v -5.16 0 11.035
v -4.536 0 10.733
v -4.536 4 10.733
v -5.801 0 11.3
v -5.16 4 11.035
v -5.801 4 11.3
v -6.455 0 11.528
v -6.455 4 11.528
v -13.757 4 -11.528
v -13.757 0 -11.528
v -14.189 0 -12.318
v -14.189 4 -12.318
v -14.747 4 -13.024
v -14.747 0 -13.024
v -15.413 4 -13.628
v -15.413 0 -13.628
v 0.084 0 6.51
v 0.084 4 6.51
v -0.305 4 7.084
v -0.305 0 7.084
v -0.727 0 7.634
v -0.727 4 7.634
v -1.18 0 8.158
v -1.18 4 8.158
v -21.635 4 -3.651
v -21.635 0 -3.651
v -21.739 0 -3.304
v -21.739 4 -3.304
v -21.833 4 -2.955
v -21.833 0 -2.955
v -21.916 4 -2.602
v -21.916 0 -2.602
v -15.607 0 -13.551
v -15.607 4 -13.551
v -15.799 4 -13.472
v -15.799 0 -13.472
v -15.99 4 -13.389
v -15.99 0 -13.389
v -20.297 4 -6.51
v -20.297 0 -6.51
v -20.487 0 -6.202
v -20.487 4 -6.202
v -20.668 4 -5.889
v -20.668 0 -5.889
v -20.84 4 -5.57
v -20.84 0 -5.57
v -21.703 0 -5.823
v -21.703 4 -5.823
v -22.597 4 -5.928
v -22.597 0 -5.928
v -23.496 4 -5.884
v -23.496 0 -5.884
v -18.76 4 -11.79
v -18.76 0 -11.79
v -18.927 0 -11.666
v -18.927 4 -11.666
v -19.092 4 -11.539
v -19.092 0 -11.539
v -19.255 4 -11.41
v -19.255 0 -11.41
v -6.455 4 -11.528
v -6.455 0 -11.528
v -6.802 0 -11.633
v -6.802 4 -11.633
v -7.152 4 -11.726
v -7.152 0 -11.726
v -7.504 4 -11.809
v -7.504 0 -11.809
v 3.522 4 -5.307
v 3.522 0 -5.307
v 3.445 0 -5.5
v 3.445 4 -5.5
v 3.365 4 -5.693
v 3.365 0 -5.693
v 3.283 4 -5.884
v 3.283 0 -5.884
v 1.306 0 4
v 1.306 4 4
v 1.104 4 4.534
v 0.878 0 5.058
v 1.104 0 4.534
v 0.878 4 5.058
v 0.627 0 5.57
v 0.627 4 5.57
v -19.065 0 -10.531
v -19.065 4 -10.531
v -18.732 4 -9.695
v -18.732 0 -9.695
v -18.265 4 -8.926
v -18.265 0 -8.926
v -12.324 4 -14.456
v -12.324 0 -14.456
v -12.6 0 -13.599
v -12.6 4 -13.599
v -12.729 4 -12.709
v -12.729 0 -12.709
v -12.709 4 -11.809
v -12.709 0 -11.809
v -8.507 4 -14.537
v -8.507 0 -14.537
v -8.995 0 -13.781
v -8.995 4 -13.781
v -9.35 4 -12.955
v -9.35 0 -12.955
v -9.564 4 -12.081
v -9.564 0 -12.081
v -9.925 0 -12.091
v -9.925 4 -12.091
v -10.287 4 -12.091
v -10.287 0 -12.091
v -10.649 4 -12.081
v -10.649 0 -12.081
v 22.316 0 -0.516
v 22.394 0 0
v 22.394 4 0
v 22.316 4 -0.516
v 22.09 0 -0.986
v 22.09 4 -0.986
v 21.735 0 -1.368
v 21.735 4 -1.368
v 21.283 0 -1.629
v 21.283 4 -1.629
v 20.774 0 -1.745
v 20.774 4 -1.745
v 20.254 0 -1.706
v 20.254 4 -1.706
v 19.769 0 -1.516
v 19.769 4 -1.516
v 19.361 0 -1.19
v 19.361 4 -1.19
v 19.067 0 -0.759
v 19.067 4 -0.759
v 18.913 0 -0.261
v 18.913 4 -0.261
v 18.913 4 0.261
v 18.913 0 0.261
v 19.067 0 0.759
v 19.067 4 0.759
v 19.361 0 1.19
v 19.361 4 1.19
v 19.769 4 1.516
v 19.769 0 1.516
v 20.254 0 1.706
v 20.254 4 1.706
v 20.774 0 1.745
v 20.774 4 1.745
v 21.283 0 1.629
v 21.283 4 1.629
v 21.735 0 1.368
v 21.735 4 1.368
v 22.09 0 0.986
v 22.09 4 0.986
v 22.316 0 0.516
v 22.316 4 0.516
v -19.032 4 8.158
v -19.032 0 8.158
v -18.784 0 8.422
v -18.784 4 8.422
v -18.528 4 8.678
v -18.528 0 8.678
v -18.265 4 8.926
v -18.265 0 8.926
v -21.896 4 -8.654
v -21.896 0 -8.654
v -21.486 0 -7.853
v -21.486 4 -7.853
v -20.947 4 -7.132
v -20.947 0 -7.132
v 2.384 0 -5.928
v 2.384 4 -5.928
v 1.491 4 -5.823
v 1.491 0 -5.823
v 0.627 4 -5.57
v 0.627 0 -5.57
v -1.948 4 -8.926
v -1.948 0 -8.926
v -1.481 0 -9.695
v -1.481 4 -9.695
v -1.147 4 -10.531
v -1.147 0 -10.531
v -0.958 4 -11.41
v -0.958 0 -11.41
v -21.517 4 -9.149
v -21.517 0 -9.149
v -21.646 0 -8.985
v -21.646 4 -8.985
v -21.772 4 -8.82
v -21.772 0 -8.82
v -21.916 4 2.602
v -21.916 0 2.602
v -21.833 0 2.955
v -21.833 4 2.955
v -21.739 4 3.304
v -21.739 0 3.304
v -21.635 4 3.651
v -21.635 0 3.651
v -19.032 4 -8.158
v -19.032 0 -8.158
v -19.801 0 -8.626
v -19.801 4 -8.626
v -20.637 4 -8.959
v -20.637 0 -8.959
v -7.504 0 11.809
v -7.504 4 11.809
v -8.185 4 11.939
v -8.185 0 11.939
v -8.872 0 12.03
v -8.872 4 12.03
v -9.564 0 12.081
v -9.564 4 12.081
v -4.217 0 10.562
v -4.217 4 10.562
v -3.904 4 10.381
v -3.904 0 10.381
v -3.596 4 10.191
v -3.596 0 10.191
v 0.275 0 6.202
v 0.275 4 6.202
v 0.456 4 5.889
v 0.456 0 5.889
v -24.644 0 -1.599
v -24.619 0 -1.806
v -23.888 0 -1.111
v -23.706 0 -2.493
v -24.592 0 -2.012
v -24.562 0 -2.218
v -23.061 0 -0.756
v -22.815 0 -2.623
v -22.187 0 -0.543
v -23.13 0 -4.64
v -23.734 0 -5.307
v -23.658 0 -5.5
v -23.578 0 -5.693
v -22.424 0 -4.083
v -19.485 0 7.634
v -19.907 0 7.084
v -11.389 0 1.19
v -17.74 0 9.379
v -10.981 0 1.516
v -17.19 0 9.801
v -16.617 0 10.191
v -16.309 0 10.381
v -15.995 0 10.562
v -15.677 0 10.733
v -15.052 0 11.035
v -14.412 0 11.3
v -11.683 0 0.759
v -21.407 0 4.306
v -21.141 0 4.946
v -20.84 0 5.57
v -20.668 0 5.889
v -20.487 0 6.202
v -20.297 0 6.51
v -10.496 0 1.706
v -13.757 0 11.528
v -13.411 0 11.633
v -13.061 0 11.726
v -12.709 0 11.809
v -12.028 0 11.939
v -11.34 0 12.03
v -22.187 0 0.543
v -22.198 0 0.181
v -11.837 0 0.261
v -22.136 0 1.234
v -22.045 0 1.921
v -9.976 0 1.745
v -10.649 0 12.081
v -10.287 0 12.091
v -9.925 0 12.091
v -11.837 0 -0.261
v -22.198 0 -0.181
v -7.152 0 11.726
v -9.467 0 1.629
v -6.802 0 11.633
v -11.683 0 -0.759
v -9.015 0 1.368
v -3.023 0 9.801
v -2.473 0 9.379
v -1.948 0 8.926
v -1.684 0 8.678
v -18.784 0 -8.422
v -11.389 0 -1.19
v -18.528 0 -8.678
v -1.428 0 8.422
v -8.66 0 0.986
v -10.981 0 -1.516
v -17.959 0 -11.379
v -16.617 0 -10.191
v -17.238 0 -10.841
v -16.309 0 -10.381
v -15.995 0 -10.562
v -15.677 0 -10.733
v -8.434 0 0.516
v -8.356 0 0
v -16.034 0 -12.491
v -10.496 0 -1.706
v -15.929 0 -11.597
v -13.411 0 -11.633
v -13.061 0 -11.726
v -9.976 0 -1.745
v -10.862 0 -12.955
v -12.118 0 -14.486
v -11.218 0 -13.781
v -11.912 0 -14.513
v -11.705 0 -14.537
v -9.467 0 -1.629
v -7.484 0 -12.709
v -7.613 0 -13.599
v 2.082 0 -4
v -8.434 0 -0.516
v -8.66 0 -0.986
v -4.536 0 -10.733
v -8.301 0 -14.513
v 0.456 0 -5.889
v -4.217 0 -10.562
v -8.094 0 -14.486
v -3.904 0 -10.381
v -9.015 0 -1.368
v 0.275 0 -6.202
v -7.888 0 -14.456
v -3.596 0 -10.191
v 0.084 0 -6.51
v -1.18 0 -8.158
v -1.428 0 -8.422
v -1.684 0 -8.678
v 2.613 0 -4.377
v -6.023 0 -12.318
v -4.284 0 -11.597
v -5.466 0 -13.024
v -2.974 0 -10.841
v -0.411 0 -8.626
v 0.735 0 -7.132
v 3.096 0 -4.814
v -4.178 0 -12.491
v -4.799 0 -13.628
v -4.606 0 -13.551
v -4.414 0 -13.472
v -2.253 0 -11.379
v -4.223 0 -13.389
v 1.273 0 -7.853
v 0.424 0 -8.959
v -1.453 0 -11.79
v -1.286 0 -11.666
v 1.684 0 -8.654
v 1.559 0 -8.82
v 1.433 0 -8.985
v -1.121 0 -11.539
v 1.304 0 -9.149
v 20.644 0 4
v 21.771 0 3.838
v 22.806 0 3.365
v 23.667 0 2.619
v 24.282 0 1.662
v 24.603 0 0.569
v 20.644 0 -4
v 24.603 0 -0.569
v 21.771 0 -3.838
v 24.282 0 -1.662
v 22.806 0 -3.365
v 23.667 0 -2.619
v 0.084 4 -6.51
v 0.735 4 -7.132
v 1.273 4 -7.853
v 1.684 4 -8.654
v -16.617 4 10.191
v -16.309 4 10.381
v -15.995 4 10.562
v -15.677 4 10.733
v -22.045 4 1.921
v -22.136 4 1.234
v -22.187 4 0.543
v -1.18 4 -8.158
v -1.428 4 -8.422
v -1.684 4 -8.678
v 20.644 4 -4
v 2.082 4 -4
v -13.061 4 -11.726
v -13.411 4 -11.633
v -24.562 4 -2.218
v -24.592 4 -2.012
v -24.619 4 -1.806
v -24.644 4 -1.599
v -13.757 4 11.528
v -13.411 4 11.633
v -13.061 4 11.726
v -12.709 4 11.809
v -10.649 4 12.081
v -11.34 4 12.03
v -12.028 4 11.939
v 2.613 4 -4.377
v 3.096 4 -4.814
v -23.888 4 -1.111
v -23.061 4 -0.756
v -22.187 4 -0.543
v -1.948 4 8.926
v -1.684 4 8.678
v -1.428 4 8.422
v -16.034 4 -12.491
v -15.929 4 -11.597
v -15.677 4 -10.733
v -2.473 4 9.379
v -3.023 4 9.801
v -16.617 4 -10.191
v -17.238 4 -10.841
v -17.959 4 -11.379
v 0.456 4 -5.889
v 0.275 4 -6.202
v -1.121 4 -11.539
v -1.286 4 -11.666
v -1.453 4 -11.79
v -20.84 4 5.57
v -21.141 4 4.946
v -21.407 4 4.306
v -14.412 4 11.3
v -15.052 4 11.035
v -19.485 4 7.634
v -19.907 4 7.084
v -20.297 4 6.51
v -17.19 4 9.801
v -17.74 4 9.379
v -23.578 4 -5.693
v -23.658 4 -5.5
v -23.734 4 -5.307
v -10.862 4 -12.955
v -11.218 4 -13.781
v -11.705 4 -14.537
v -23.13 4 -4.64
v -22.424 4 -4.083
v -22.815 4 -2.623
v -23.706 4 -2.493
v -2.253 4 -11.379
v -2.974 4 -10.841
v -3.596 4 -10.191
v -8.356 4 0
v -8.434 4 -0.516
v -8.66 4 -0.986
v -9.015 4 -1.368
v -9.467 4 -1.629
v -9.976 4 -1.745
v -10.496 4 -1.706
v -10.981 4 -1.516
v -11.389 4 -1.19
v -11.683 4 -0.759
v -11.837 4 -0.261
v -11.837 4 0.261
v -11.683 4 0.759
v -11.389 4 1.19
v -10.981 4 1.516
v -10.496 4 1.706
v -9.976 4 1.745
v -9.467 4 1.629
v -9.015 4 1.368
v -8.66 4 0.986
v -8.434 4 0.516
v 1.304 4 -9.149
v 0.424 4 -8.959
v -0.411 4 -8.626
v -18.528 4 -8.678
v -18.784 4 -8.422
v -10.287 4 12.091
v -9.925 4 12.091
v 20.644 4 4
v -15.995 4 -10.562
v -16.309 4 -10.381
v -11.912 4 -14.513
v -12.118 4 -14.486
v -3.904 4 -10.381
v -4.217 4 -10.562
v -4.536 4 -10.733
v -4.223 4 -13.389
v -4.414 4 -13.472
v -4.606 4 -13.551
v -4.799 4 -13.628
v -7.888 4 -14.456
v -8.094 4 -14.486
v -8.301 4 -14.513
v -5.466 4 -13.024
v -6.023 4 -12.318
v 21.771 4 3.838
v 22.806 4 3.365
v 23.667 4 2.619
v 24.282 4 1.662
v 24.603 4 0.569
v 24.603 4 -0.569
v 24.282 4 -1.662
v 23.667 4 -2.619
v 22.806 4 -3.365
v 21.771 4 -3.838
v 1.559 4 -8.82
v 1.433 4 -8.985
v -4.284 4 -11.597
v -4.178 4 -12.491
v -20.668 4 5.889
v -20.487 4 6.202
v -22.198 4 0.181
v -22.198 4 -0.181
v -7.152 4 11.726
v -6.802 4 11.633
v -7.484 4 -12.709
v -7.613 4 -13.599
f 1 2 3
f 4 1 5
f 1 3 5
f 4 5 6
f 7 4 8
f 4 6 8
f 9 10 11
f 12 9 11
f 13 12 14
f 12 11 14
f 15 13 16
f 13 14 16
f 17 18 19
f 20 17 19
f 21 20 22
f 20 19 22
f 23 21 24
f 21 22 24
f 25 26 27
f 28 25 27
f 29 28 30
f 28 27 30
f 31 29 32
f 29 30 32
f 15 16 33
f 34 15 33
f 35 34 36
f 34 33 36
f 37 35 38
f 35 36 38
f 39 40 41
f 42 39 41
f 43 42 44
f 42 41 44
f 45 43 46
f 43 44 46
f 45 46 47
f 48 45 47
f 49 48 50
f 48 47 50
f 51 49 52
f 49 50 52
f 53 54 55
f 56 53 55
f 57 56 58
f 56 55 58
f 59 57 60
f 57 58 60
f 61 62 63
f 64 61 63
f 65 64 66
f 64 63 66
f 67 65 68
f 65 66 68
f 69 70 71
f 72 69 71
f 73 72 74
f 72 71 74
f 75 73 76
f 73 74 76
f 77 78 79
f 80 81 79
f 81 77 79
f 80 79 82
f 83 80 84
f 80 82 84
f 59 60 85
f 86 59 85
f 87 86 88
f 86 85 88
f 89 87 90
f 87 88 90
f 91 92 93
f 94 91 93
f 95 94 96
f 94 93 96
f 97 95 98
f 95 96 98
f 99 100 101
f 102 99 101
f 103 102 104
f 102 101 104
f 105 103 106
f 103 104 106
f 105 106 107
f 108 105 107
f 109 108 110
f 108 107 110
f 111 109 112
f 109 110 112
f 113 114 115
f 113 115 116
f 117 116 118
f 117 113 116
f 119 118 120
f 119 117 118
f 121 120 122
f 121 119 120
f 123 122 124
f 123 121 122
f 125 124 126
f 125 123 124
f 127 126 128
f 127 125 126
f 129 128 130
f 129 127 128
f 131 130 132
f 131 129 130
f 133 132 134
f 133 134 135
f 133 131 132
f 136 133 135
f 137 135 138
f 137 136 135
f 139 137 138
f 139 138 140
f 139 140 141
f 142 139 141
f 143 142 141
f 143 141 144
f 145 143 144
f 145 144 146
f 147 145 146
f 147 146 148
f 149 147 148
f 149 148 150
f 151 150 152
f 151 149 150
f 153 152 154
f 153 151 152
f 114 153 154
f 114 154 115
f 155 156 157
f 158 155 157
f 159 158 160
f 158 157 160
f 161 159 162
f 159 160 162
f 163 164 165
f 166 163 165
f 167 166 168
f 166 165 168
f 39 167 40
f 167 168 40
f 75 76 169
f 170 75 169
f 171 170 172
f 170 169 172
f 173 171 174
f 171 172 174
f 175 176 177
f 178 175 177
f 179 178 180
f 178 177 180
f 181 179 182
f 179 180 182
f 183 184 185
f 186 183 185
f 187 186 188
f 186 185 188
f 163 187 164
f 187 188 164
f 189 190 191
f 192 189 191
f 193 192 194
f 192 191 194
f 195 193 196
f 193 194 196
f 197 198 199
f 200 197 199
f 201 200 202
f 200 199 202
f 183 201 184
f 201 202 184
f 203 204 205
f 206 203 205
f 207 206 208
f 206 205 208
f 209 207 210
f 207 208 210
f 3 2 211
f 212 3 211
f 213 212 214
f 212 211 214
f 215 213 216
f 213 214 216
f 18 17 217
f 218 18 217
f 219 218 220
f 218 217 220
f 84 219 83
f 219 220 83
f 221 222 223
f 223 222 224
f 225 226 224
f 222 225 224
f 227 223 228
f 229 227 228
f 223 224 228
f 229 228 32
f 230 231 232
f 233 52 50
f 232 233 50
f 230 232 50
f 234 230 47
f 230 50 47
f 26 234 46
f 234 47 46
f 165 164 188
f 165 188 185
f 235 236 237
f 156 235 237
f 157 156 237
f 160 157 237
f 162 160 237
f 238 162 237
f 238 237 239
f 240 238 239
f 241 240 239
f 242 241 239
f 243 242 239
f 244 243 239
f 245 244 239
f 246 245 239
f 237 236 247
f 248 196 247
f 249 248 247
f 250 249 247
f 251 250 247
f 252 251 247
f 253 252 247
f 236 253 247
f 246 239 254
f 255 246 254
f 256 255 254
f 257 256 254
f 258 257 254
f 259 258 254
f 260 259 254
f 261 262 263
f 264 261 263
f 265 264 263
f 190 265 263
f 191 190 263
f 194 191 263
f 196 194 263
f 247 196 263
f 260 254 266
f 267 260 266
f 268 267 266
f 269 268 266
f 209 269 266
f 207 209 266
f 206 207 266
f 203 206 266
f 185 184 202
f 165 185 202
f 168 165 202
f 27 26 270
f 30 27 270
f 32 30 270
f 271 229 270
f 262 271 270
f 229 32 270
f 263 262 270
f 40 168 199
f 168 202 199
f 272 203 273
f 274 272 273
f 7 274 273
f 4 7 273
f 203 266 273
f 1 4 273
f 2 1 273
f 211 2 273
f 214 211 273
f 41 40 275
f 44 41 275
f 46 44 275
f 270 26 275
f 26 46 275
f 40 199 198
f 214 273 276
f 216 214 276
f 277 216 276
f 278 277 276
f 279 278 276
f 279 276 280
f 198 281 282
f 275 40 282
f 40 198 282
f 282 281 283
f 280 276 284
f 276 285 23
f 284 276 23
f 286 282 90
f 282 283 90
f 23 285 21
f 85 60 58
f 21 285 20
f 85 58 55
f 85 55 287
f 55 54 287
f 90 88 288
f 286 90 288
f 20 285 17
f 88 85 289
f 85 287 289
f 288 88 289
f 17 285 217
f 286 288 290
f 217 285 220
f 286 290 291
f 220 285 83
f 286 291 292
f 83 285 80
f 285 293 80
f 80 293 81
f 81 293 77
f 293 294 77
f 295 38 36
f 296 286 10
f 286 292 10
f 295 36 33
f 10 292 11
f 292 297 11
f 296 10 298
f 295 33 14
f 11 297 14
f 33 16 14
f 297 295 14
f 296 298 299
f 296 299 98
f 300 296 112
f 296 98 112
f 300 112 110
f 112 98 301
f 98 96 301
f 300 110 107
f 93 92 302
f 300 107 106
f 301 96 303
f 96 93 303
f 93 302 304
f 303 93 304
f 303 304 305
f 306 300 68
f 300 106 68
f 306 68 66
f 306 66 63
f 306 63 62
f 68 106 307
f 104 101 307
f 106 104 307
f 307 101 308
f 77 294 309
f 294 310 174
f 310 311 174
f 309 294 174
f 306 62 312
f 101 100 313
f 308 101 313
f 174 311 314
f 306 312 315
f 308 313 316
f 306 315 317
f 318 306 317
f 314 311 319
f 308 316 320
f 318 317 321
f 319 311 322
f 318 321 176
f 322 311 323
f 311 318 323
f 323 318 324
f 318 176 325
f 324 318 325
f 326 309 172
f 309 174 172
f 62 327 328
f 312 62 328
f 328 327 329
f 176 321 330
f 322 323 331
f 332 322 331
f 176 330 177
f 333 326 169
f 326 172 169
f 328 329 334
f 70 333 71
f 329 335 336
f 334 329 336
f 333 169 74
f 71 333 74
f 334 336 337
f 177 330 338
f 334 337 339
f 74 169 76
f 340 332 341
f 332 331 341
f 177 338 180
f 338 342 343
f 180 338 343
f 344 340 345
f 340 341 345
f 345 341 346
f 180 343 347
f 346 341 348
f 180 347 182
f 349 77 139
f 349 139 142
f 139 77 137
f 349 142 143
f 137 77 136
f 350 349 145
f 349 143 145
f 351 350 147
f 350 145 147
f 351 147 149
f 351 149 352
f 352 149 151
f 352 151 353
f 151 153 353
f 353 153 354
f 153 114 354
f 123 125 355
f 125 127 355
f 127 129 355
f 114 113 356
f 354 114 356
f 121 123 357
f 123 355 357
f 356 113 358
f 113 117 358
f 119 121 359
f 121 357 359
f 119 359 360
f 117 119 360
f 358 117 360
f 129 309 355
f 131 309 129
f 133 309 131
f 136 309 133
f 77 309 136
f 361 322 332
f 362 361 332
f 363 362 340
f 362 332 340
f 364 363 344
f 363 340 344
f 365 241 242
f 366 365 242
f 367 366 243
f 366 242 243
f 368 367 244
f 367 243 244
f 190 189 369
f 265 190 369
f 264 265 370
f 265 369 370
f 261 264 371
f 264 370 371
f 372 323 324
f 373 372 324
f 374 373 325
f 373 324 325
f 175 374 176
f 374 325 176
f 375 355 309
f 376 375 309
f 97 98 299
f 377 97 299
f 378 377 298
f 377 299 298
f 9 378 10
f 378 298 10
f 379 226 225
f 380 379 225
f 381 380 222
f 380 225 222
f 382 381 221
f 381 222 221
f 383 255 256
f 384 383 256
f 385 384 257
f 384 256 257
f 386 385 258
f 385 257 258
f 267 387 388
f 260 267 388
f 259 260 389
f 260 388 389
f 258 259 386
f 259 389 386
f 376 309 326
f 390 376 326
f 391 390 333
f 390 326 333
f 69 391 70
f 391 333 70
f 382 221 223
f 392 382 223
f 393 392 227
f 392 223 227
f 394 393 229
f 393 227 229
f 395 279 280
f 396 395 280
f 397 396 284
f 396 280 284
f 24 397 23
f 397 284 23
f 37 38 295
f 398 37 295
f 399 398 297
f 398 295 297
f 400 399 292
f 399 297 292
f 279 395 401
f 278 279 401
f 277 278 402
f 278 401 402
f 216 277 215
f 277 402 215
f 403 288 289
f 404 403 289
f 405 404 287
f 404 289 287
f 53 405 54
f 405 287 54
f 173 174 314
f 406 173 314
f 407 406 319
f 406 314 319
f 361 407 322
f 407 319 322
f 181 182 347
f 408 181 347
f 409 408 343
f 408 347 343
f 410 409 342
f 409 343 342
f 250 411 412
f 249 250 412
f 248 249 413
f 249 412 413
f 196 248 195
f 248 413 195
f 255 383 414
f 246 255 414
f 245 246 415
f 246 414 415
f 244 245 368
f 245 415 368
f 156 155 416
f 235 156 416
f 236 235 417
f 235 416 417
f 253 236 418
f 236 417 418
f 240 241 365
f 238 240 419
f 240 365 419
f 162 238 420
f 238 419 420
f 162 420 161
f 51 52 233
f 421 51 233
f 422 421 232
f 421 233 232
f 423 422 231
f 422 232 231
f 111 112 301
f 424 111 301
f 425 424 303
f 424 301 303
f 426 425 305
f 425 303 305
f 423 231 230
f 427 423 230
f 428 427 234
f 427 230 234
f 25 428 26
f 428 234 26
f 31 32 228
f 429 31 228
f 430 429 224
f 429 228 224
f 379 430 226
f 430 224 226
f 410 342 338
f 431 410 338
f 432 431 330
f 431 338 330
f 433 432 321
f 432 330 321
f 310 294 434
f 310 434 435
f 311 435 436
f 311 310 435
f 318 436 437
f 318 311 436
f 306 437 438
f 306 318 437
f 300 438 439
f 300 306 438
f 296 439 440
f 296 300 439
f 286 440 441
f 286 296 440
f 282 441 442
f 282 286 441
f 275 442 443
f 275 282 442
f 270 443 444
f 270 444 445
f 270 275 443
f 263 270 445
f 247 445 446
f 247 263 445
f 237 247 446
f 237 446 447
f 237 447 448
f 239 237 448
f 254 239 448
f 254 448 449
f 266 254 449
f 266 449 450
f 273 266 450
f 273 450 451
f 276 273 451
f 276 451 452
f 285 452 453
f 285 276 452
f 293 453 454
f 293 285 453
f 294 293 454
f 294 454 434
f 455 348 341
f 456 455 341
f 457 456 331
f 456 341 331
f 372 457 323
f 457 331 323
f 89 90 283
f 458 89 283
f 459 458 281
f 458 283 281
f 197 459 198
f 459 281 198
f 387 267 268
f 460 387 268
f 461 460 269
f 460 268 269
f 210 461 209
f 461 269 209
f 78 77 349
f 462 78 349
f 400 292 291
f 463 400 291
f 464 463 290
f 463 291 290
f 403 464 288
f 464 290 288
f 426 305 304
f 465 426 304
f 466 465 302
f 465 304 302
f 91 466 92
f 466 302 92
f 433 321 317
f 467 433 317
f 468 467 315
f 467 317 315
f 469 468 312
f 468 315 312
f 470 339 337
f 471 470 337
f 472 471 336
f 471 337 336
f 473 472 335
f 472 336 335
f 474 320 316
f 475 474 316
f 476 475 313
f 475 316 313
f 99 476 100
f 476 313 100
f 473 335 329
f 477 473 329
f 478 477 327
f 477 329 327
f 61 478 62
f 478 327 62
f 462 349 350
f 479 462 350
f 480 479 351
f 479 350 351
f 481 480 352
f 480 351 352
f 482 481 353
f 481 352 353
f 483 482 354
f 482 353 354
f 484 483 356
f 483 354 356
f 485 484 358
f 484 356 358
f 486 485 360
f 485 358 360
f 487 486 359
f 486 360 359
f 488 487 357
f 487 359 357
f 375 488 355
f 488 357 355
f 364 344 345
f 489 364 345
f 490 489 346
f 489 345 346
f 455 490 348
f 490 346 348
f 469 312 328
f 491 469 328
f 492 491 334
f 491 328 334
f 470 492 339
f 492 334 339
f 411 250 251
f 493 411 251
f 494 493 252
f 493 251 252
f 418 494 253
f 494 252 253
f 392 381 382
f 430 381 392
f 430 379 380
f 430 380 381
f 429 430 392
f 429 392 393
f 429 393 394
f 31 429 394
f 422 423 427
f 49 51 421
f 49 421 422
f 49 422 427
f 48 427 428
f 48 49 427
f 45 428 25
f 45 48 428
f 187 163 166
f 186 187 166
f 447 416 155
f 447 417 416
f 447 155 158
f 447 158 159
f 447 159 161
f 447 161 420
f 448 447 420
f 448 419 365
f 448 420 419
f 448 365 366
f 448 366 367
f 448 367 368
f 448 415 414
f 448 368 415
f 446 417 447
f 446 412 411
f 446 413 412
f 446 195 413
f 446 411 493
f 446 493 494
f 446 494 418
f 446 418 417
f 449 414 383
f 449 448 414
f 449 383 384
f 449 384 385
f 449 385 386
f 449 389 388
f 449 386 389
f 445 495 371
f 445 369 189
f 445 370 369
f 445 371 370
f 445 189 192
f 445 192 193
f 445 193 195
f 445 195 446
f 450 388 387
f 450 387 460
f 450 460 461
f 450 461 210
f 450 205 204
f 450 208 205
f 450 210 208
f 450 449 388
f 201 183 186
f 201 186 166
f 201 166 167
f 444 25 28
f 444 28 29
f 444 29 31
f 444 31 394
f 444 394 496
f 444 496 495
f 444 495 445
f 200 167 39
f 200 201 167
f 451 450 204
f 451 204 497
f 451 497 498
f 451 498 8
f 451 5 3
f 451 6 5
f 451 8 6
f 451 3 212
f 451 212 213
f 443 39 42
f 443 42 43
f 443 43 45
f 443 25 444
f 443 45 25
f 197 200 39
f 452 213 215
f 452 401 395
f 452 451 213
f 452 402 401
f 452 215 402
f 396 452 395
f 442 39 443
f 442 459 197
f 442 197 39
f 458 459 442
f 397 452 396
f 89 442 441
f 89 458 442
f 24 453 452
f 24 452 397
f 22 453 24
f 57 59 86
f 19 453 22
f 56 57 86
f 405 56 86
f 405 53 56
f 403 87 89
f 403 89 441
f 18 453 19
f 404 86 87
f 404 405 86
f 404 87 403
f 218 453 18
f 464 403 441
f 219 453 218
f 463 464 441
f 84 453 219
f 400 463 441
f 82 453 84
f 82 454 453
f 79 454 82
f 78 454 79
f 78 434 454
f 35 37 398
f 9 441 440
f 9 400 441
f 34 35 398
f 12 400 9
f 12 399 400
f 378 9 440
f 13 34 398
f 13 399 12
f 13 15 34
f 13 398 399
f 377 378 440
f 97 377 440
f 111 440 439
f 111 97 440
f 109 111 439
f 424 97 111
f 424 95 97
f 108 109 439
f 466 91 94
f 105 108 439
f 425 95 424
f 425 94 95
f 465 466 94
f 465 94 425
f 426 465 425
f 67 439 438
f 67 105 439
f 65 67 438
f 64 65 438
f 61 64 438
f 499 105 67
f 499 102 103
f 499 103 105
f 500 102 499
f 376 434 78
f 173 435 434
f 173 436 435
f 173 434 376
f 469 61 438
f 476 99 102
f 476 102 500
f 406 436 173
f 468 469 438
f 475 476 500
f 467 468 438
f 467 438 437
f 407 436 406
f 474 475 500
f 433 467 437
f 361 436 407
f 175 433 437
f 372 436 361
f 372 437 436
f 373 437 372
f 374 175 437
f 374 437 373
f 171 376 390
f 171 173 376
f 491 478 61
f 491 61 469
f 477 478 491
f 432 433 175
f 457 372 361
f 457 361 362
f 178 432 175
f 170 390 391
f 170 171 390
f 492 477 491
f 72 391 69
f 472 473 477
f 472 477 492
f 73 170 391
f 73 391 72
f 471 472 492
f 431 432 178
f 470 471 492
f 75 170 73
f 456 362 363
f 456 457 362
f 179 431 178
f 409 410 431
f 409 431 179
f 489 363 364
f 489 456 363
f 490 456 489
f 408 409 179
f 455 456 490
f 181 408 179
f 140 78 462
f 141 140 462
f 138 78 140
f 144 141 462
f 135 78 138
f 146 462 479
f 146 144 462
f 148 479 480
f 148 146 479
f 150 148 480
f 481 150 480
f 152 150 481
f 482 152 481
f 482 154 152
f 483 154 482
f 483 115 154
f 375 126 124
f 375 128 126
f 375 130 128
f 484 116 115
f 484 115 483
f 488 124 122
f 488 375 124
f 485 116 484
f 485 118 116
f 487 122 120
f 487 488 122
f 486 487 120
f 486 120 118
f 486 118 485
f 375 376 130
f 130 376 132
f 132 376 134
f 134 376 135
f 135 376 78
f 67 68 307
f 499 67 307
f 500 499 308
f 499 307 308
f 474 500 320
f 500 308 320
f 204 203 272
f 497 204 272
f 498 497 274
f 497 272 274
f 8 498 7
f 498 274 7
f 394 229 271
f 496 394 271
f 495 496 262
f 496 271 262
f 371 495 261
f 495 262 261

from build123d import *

# Parameters (mm, degrees)
SKETCH1_R           = 1.75
BOSS_EXTRUDE1_DEPTH = 4
CUT_EXTRUDE1_DEPTH  = 10


with BuildPart() as part:
    # Sketch1 → Boss-Extrude1 (new body)
    with BuildSketch(Plane(origin=(0, 0, 0), x_dir=(1, 0, 0), z_dir=(0, 1, 0))):
        with BuildLine():
            Line((20.643657446, 4), (2.081641936, 4))
            ThreePointArc((2.081641936, 4), (2.861028333, 4.588201733), (3.521749436, 5.30713988))
            ThreePointArc((3.521749436, 5.30713988), (3.405395609, 5.596745198), (3.282888305, 5.883801663))
            ThreePointArc((3.282888305, 5.883801663), (1.93527598, 5.894040025), (0.627094961, 5.57027124))
            ThreePointArc((0.627094961, 5.57027124), (0.366286148, 6.046375), (0.084372603, 6.510293938))
            ThreePointArc((0.084372603, 6.510293938), (1.018855105, 7.48132754), (1.683794586, 8.65351323))
            ThreePointArc((1.683794586, 8.65351323), (1.496450048, 8.903135899), (1.303821399, 9.148703928))
            ThreePointArc((1.303821399, 9.148703928), (-0.000522033, 8.809805691), (-1.180330337, 8.158486898))
            ThreePointArc((-1.180330337, 8.158486898), (-1.555477026, 8.550865528), (-1.947855656, 8.926012217))
            ThreePointArc((-1.947855656, 8.926012217), (-1.296536862, 10.105820521), (-0.957638625, 11.410163953))
            ThreePointArc((-0.957638625, 11.410163953), (-1.203206655, 11.602792602), (-1.452829324, 11.79013714))
            ThreePointArc((-1.452829324, 11.79013714), (-2.625015014, 11.125197659), (-3.596048616, 10.190715157))
            ThreePointArc((-3.596048616, 10.190715157), (-4.059967554, 10.472628702), (-4.536071314, 10.733437515))
            ThreePointArc((-4.536071314, 10.733437515), (-4.212302529, 12.041618533), (-4.222540891, 13.389230859))
            ThreePointArc((-4.222540891, 13.389230859), (-4.509597355, 13.511738163), (-4.799202674, 13.62809199))
            ThreePointArc((-4.799202674, 13.62809199), (-5.759348103, 12.682425791), (-6.455432668, 11.528463019))
            ThreePointArc((-6.455432668, 11.528463019), (-6.976508546, 11.680699536), (-7.503891752, 11.809396783))
            ThreePointArc((-7.503891752, 11.809396783), (-7.529737283, 13.156800143), (-7.888414517, 14.455843809))
            ThreePointArc((-7.888414517, 14.455843809), (-8.197396993, 14.499881098), (-8.507248835, 14.537314892))
            ThreePointArc((-8.507248835, 14.537314892), (-9.18992168, 13.375367565), (-9.563620196, 12.080565177))
            ThreePointArc((-9.563620196, 12.080565177), (-10.106342554, 12.09275), (-10.649064912, 12.080565177))
            ThreePointArc((-10.649064912, 12.080565177), (-11.022763428, 13.375367565), (-11.705436272, 14.537314892))
            ThreePointArc((-11.705436272, 14.537314892), (-12.015288115, 14.499881098), (-12.324270591, 14.455843809))
            ThreePointArc((-12.324270591, 14.455843809), (-12.682947825, 13.156800143), (-12.708793355, 11.809396783))
            ThreePointArc((-12.708793355, 11.809396783), (-13.236176561, 11.680699536), (-13.757252439, 11.528463019))
            ThreePointArc((-13.757252439, 11.528463019), (-14.453337005, 12.682425791), (-15.413482434, 13.62809199))
            ThreePointArc((-15.413482434, 13.62809199), (-15.703087752, 13.511738163), (-15.990144217, 13.389230859))
            ThreePointArc((-15.990144217, 13.389230859), (-16.000382579, 12.041618533), (-15.676613793, 10.733437515))
            ThreePointArc((-15.676613793, 10.733437515), (-16.152717554, 10.472628702), (-16.616636492, 10.190715157))
            ThreePointArc((-16.616636492, 10.190715157), (-17.587670094, 11.125197659), (-18.759855783, 11.79013714))
            ThreePointArc((-18.759855783, 11.79013714), (-19.009478453, 11.602792602), (-19.255046482, 11.410163953))
            ThreePointArc((-19.255046482, 11.410163953), (-18.916148245, 10.105820521), (-18.264829452, 8.926012217))
            ThreePointArc((-18.264829452, 8.926012217), (-18.657208082, 8.550865528), (-19.032354771, 8.158486898))
            ThreePointArc((-19.032354771, 8.158486898), (-20.212163074, 8.809805691), (-21.516506507, 9.148703928))
            ThreePointArc((-21.516506507, 9.148703928), (-21.709135156, 8.903135899), (-21.896479694, 8.65351323))
            ThreePointArc((-21.896479694, 8.65351323), (-21.231540213, 7.48132754), (-20.297057711, 6.510293938))
            ThreePointArc((-20.297057711, 6.510293938), (-20.578971255, 6.046375), (-20.839780068, 5.57027124))
            ThreePointArc((-20.839780068, 5.57027124), (-22.147961087, 5.894040025), (-23.495573413, 5.883801663))
            ThreePointArc((-23.495573413, 5.883801663), (-23.618080717, 5.596745198), (-23.734434544, 5.30713988))
            ThreePointArc((-23.734434544, 5.30713988), (-22.788768345, 4.346994451), (-21.634805572, 3.650909885))
            ThreePointArc((-21.634805572, 3.650909885), (-21.78704209, 3.129834008), (-21.915739337, 2.602450802))
            ThreePointArc((-21.915739337, 2.602450802), (-23.263142697, 2.576605271), (-24.562186363, 2.217928037))
            ThreePointArc((-24.562186363, 2.217928037), (-24.606223651, 1.908945561), (-24.643657446, 1.599093719))
            ThreePointArc((-24.643657446, 1.599093719), (-23.481710119, 0.916420874), (-22.186907731, 0.542722358))
            ThreePointArc((-22.186907731, 0.542722358), (-22.199092554, 0), (-22.186907731, -0.542722358))
            ThreePointArc((-22.186907731, -0.542722358), (-23.481710119, -0.916420874), (-24.643657446, -1.599093719))
            ThreePointArc((-24.643657446, -1.599093719), (-24.606223651, -1.908945561), (-24.562186363, -2.217928037))
            ThreePointArc((-24.562186363, -2.217928037), (-23.263142697, -2.576605271), (-21.915739337, -2.602450802))
            ThreePointArc((-21.915739337, -2.602450802), (-21.78704209, -3.129834008), (-21.634805572, -3.650909885))
            ThreePointArc((-21.634805572, -3.650909885), (-22.788768345, -4.346994451), (-23.734434544, -5.30713988))
            ThreePointArc((-23.734434544, -5.30713988), (-23.618080717, -5.596745198), (-23.495573413, -5.883801663))
            ThreePointArc((-23.495573413, -5.883801663), (-22.147961087, -5.894040025), (-20.839780068, -5.57027124))
            ThreePointArc((-20.839780068, -5.57027124), (-20.578971255, -6.046375), (-20.297057711, -6.510293938))
            ThreePointArc((-20.297057711, -6.510293938), (-21.231540213, -7.48132754), (-21.896479694, -8.65351323))
            ThreePointArc((-21.896479694, -8.65351323), (-21.709135156, -8.903135899), (-21.516506507, -9.148703928))
            ThreePointArc((-21.516506507, -9.148703928), (-20.212163074, -8.809805691), (-19.032354771, -8.158486898))
            ThreePointArc((-19.032354771, -8.158486898), (-18.657208082, -8.550865528), (-18.264829452, -8.926012217))
            ThreePointArc((-18.264829452, -8.926012217), (-18.916148245, -10.105820521), (-19.255046482, -11.410163953))
            ThreePointArc((-19.255046482, -11.410163953), (-19.009478453, -11.602792602), (-18.759855783, -11.79013714))
            ThreePointArc((-18.759855783, -11.79013714), (-17.587670094, -11.125197659), (-16.616636492, -10.190715157))
            ThreePointArc((-16.616636492, -10.190715157), (-16.152717554, -10.472628702), (-15.676613793, -10.733437515))
            ThreePointArc((-15.676613793, -10.733437515), (-16.000382579, -12.041618533), (-15.990144217, -13.389230859))
            ThreePointArc((-15.990144217, -13.389230859), (-15.703087752, -13.511738163), (-15.413482434, -13.62809199))
            ThreePointArc((-15.413482434, -13.62809199), (-14.453337005, -12.682425791), (-13.757252439, -11.528463019))
            ThreePointArc((-13.757252439, -11.528463019), (-13.236176561, -11.680699536), (-12.708793355, -11.809396783))
            ThreePointArc((-12.708793355, -11.809396783), (-12.682947825, -13.156800143), (-12.324270591, -14.455843809))
            ThreePointArc((-12.324270591, -14.455843809), (-12.015288115, -14.499881098), (-11.705436272, -14.537314892))
            ThreePointArc((-11.705436272, -14.537314892), (-11.022763428, -13.375367565), (-10.649064912, -12.080565177))
            ThreePointArc((-10.649064912, -12.080565177), (-10.106342554, -12.09275), (-9.563620196, -12.080565177))
            ThreePointArc((-9.563620196, -12.080565177), (-9.18992168, -13.375367565), (-8.507248835, -14.537314892))
            ThreePointArc((-8.507248835, -14.537314892), (-8.197396993, -14.499881098), (-7.888414517, -14.455843809))
            ThreePointArc((-7.888414517, -14.455843809), (-7.529737283, -13.156800143), (-7.503891752, -11.809396783))
            ThreePointArc((-7.503891752, -11.809396783), (-6.976508546, -11.680699536), (-6.455432668, -11.528463019))
            ThreePointArc((-6.455432668, -11.528463019), (-5.759348103, -12.682425791), (-4.799202674, -13.62809199))
            ThreePointArc((-4.799202674, -13.62809199), (-4.509597355, -13.511738163), (-4.222540891, -13.389230859))
            ThreePointArc((-4.222540891, -13.389230859), (-4.212302529, -12.041618533), (-4.536071314, -10.733437515))
            ThreePointArc((-4.536071314, -10.733437515), (-4.059967554, -10.472628702), (-3.596048616, -10.190715157))
            ThreePointArc((-3.596048616, -10.190715157), (-2.625015014, -11.125197659), (-1.452829324, -11.79013714))
            ThreePointArc((-1.452829324, -11.79013714), (-1.203206655, -11.602792602), (-0.957638625, -11.410163953))
            ThreePointArc((-0.957638625, -11.410163953), (-1.296536862, -10.105820521), (-1.947855656, -8.926012217))
            ThreePointArc((-1.947855656, -8.926012217), (-1.555477026, -8.550865528), (-1.180330337, -8.158486898))
            ThreePointArc((-1.180330337, -8.158486898), (-0.000522033, -8.809805691), (1.303821399, -9.148703928))
            ThreePointArc((1.303821399, -9.148703928), (1.496450048, -8.903135899), (1.683794586, -8.65351323))
            ThreePointArc((1.683794586, -8.65351323), (1.018855105, -7.48132754), (0.084372603, -6.510293938))
            ThreePointArc((0.084372603, -6.510293938), (0.366286148, -6.046375), (0.627094961, -5.57027124))
            ThreePointArc((0.627094961, -5.57027124), (1.93527598, -5.894040025), (3.282888305, -5.883801663))
            ThreePointArc((3.282888305, -5.883801663), (3.405395609, -5.596745198), (3.521749436, -5.30713988))
            ThreePointArc((3.521749436, -5.30713988), (2.861028333, -4.588201733), (2.081641936, -4))
            Line((2.081641936, -4), (20.643657446, -4))
            ThreePointArc((20.643657446, -4), (24.643657446, 0), (20.643657446, 4))
        make_face()
        with Locations((-10.106342554, 0)):
            Circle(SKETCH1_R, mode=Mode.SUBTRACT)
        with Locations((20.643657446, 0)):
            Circle(SKETCH1_R, mode=Mode.SUBTRACT)
    extrude(amount=BOSS_EXTRUDE1_DEPTH)

    # Sketch2 → Cut-Extrude1 (cut)
    with BuildSketch(Plane(origin=(0, 4, 0), x_dir=(1, 0, 0), z_dir=(0, 1, 0))):
        with BuildLine():
            ThreePointArc((-24.562186363, -2.217928037), (-23.263142697, -2.576605271), (-21.915739337, -2.602450802))
            ThreePointArc((-21.915739337, -2.602450802), (-22.095637401, -1.578420611), (-22.186907731, -0.542722358))
            ThreePointArc((-22.186907731, -0.542722358), (-23.481710119, -0.916420874), (-24.643657446, -1.599093719))
            ThreePointArc((-24.643657446, -1.599093719), (-24.606223651, -1.908945561), (-24.562186363, -2.217928037))
        make_face()
        with BuildLine():
            ThreePointArc((-23.495573413, -5.883801663), (-22.147961087, -5.894040025), (-20.839780068, -5.57027124))
            ThreePointArc((-20.839780068, -5.57027124), (-21.278586771, -4.627695077), (-21.634805572, -3.650909885))
            ThreePointArc((-21.634805572, -3.650909885), (-22.788768345, -4.346994451), (-23.734434544, -5.30713988))
            ThreePointArc((-23.734434544, -5.30713988), (-23.618080717, -5.596745198), (-23.495573413, -5.883801663))
        make_face()
        with BuildLine():
            ThreePointArc((-21.516506507, -9.148703928), (-20.212163074, -8.809805691), (-19.032354771, -8.158486898))
            ThreePointArc((-19.032354771, -8.158486898), (-19.70016616, -7.361599771), (-20.297057711, -6.510293938))
            ThreePointArc((-20.297057711, -6.510293938), (-21.231540213, -7.48132754), (-21.896479694, -8.65351323))
            ThreePointArc((-21.896479694, -8.65351323), (-21.709135156, -8.903135899), (-21.516506507, -9.148703928))
        make_face()
        with BuildLine():
            ThreePointArc((-18.759855783, -11.79013714), (-17.587670094, -11.125197659), (-16.616636492, -10.190715157))
            ThreePointArc((-16.616636492, -10.190715157), (-17.467942324, -9.593823606), (-18.264829452, -8.926012217))
            ThreePointArc((-18.264829452, -8.926012217), (-18.916148245, -10.105820521), (-19.255046482, -11.410163953))
            ThreePointArc((-19.255046482, -11.410163953), (-19.009478453, -11.602792602), (-18.759855783, -11.79013714))
        make_face()
        with BuildLine():
            ThreePointArc((-15.413482434, -13.62809199), (-14.453337005, -12.682425791), (-13.757252439, -11.528463019))
            ThreePointArc((-13.757252439, -11.528463019), (-14.734037631, -11.172244217), (-15.676613793, -10.733437515))
            ThreePointArc((-15.676613793, -10.733437515), (-16.000382579, -12.041618533), (-15.990144217, -13.389230859))
            ThreePointArc((-15.990144217, -13.389230859), (-15.703087752, -13.511738163), (-15.413482434, -13.62809199))
        make_face()
        with BuildLine():
            ThreePointArc((-11.705436272, -14.537314892), (-11.022763428, -13.375367565), (-10.649064912, -12.080565177))
            ThreePointArc((-10.649064912, -12.080565177), (-11.684763165, -11.989294847), (-12.708793355, -11.809396783))
            ThreePointArc((-12.708793355, -11.809396783), (-12.682947825, -13.156800143), (-12.324270591, -14.455843809))
            ThreePointArc((-12.324270591, -14.455843809), (-12.015288115, -14.499881098), (-11.705436272, -14.537314892))
        make_face()
        with BuildLine():
            ThreePointArc((-7.888414517, -14.455843809), (-7.529737283, -13.156800143), (-7.503891752, -11.809396783))
            ThreePointArc((-7.503891752, -11.809396783), (-8.527921943, -11.989294847), (-9.563620196, -12.080565177))
            ThreePointArc((-9.563620196, -12.080565177), (-9.18992168, -13.375367565), (-8.507248835, -14.537314892))
            ThreePointArc((-8.507248835, -14.537314892), (-8.197396993, -14.499881098), (-7.888414517, -14.455843809))
        make_face()
        with BuildLine():
            ThreePointArc((-4.222540891, -13.389230859), (-4.212302529, -12.041618533), (-4.536071314, -10.733437515))
            ThreePointArc((-4.536071314, -10.733437515), (-5.478647477, -11.172244217), (-6.455432668, -11.528463019))
            ThreePointArc((-6.455432668, -11.528463019), (-5.759348103, -12.682425791), (-4.799202674, -13.62809199))
            ThreePointArc((-4.799202674, -13.62809199), (-4.509597355, -13.511738163), (-4.222540891, -13.389230859))
        make_face()
        with BuildLine():
            ThreePointArc((-0.957638625, -11.410163953), (-1.296536862, -10.105820521), (-1.947855656, -8.926012217))
            ThreePointArc((-1.947855656, -8.926012217), (-2.744742783, -9.593823606), (-3.596048616, -10.190715157))
            ThreePointArc((-3.596048616, -10.190715157), (-2.625015014, -11.125197659), (-1.452829324, -11.79013714))
            ThreePointArc((-1.452829324, -11.79013714), (-1.203206655, -11.602792602), (-0.957638625, -11.410163953))
        make_face()
        with BuildLine():
            ThreePointArc((1.683794586, -8.65351323), (1.018855105, -7.48132754), (0.084372603, -6.510293938))
            ThreePointArc((0.084372603, -6.510293938), (-0.512518948, -7.361599771), (-1.180330337, -8.158486898))
            ThreePointArc((-1.180330337, -8.158486898), (-0.000522033, -8.809805691), (1.303821399, -9.148703928))
            ThreePointArc((1.303821399, -9.148703928), (1.496450048, -8.903135899), (1.683794586, -8.65351323))
        make_face()
        with BuildLine():
            ThreePointArc((3.521749436, -5.30713988), (2.861028333, -4.588201733), (2.081641936, -4))
            Line((2.081641936, -4), (1.305695063, -4))
            ThreePointArc((1.305695063, -4), (0.994195953, -4.797149927), (0.627094961, -5.57027124))
            ThreePointArc((0.627094961, -5.57027124), (1.93527598, -5.894040025), (3.282888305, -5.883801663))
            ThreePointArc((3.282888305, -5.883801663), (3.405395609, -5.596745198), (3.521749436, -5.30713988))
        make_face()
    extrude(amount=-CUT_EXTRUDE1_DEPTH, mode=Mode.SUBTRACT)


solid = part.part
